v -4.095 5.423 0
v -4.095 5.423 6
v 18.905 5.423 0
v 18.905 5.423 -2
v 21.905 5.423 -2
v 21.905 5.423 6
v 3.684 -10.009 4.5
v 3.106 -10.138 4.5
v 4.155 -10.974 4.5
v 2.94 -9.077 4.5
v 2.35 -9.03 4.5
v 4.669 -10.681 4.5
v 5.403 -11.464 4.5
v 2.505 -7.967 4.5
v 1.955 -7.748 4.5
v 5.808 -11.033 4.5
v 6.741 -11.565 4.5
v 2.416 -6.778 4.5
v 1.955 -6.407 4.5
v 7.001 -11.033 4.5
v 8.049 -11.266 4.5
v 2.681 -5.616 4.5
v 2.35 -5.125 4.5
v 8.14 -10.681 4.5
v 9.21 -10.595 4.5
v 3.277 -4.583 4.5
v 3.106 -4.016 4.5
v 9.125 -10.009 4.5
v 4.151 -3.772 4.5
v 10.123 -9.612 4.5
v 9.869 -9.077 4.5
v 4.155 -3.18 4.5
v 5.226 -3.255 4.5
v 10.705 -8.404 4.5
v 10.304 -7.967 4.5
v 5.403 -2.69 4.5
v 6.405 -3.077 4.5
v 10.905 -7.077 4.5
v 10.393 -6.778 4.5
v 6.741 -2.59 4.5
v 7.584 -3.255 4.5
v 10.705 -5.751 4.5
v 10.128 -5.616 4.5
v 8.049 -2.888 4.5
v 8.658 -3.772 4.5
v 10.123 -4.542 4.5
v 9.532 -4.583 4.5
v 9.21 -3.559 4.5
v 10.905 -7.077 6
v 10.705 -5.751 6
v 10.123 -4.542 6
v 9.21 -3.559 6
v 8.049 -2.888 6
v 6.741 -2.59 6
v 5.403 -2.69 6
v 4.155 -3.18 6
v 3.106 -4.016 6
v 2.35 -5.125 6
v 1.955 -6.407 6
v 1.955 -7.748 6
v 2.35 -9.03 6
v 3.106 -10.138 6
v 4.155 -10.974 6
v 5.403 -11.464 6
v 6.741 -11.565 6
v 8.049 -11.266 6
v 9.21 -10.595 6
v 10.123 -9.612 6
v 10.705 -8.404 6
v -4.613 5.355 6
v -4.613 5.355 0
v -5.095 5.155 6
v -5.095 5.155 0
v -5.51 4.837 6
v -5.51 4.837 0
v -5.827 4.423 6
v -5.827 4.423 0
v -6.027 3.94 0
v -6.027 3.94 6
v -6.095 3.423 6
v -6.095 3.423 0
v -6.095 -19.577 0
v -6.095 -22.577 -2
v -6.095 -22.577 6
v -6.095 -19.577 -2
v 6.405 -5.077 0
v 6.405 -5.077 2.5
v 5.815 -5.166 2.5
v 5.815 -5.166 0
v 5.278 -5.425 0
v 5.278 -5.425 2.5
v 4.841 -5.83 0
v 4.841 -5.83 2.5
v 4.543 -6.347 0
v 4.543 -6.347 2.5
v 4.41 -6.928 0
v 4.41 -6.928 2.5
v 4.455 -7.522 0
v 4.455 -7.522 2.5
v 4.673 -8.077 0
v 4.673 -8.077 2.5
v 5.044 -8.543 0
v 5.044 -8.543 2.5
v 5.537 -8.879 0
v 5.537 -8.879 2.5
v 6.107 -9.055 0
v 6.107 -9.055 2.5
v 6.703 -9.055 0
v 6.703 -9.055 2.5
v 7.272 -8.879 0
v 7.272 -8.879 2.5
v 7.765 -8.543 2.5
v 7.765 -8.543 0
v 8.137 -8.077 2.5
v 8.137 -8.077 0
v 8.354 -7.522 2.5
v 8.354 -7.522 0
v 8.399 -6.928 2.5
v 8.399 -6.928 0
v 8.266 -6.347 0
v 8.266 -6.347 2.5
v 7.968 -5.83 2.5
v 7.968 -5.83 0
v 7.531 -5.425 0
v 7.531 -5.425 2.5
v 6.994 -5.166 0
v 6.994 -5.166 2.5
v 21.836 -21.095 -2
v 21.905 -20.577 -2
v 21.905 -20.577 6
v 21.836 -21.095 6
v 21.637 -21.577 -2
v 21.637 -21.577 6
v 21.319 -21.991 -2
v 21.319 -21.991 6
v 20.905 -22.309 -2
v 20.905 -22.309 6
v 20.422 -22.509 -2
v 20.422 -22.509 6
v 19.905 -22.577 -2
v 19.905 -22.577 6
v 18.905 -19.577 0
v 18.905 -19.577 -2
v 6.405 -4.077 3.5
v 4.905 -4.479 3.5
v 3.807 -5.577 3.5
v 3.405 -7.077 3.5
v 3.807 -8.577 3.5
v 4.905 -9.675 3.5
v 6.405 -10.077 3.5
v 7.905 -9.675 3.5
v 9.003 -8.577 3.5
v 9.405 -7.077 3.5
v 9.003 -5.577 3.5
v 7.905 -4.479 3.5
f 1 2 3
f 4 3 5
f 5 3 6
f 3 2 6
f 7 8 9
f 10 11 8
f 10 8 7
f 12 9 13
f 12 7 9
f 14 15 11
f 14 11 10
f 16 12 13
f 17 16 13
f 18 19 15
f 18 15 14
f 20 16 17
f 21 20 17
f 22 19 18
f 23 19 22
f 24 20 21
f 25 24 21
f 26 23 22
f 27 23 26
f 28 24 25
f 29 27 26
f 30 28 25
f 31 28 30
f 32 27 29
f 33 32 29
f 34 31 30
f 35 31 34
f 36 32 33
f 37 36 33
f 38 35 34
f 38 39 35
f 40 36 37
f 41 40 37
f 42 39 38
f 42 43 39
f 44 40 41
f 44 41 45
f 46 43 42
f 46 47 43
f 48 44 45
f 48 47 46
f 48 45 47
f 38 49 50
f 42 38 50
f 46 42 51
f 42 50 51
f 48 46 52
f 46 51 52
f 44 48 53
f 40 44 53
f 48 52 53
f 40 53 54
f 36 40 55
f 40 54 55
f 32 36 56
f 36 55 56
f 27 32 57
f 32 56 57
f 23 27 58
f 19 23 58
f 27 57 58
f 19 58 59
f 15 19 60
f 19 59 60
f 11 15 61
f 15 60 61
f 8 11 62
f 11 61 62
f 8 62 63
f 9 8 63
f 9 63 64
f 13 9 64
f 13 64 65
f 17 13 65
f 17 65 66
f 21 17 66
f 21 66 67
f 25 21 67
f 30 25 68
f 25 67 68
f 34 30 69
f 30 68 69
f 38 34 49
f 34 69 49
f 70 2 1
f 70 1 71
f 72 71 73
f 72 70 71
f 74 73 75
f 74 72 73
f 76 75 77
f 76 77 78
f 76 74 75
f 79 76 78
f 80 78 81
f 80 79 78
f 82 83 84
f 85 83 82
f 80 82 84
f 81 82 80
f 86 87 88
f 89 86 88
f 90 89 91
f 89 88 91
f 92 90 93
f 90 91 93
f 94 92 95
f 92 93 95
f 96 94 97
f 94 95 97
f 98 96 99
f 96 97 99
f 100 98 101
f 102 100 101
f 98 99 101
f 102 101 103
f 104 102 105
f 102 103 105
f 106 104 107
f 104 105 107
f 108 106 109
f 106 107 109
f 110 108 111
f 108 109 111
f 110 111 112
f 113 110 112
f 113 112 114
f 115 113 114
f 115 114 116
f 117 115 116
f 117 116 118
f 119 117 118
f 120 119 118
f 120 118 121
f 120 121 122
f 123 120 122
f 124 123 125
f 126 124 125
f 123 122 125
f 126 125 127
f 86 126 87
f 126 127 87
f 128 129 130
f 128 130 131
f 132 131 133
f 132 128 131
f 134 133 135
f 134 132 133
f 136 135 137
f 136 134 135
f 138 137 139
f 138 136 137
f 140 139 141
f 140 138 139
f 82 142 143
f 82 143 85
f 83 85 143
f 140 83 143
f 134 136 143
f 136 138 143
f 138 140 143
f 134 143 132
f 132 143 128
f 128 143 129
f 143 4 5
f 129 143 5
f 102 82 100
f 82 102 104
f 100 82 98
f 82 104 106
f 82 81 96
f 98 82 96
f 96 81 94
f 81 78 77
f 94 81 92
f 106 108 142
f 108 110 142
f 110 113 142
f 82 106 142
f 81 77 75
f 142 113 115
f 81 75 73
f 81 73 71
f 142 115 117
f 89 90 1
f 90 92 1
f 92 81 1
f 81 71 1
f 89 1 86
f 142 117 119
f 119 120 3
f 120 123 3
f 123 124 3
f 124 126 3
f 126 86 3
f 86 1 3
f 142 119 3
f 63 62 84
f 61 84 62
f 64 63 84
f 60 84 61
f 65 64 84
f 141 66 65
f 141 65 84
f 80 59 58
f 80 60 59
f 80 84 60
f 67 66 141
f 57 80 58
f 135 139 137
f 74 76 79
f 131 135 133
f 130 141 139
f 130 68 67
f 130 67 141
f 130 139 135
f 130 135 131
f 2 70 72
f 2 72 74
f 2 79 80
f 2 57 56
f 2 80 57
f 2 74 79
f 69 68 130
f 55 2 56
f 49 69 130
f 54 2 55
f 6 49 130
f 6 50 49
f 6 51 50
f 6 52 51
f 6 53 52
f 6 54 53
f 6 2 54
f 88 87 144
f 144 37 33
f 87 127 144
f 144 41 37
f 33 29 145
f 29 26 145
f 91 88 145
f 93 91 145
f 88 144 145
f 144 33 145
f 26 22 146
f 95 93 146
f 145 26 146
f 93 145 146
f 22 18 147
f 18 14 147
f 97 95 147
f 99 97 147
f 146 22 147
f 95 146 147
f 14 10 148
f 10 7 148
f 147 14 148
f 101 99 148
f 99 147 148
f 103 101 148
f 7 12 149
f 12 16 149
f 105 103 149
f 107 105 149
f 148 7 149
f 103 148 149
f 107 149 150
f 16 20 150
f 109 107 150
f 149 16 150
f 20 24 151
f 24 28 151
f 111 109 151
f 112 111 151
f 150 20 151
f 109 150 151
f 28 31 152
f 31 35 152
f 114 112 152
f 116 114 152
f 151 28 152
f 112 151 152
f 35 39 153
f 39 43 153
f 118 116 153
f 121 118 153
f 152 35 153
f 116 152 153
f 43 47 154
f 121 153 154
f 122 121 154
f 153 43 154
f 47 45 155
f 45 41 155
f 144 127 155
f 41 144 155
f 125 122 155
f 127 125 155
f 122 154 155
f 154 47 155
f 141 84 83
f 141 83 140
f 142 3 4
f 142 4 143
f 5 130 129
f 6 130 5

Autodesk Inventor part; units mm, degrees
ref_plane "YZ Plane" through (0, 0, 0) normal (1, 0, 0) x (0, 1, 0)
ref_plane "XZ Plane" through (0, 0, 0) normal (0, 1, 0) x (-1, 0, 0)
ref_plane "XY Plane" through (0, 0, 0) normal (0, 0, 1) x (1, 0, 0)
sketch "Sketch1" plane through (0, 0, 0) normal (0, 0, 1) x (1, 0, 0)
  line L0 (-6.0954, 5.4228) -> (18.9046, 5.4228)
  line L1 (18.9046, 5.4228) -> (18.9046, -19.5772)
  line L2 (18.9046, -19.5772) -> (-6.0954, -19.5772)
  line L3 (-6.0954, -19.5772) -> (-6.0954, 5.4228)
  line L4 (-6.0954, -22.5772) -> (21.9046, -22.5772)
  line L5 (21.9046, -22.5772) -> (21.9046, 5.4228)
  line L6 (18.9046, 5.4228) -> (21.9046, 5.4228)
  line L7 (-6.0954, -19.5772) -> (-6.0954, -22.5772)
  point P0 (0, 0)
  point P1 (6.4046, -7.0772)
  dimension "d0" = 25
  dimension "d1" = 25
  dimension "d2" = 3
  dimension "d3" = 3
  dimension "d4" = 12.5
  dimension "d5" = 12.5
extrude "Extrusion1" add sketch "Sketch1" along normal blind 6
extrude "Extrusion2" add sketch "Sketch1" against normal blind 2 contours L6 L5 L4 L7 L2 L1
hole "Hole1" at (6.4046, -7.0772, 0) direction (0, 0, 1) diameter 4 end through all
sketch "Sketch2" plane through (0, 0, 6) normal (0, 0, 1) x (1, 0, 0)
  circle A0 centre (6.4046, -7.0772) radius 2 projected
  line L0 (-6.0954, 5.4228) -> (-6.0954, -22.5772) projected
  line L1 (-6.0954, -22.5772) -> (21.9046, -22.5772) projected
  line L2 (21.9046, -22.5772) -> (21.9046, 5.4228) projected
  line L3 (21.9046, 5.4228) -> (-6.0954, 5.4228) projected
  circle A1 centre (6.4046, -7.0772) radius 2 projected
  circle A2 centre (6.4046, -7.0772) radius 4.5
  point P0 (0, 0)
  dimension "d17" = 9
extrude "Extrusion3" cut sketch "Sketch2" against normal blind 1.5 contours A2
chamfer "Chamfer1" distance 2 angle 45 1 edges at (6.4046, -9.0772, 4.5)
fillet "Fillet1" radius 2 2 edges at (21.9046, -22.5772, 2) (-6.0954, 5.4228, 3)
equation "\"d4\" = 0.5 * d0"
properties part number "3DP_PLA_Base_plate_corner_leg" material "ABS Plastic"
